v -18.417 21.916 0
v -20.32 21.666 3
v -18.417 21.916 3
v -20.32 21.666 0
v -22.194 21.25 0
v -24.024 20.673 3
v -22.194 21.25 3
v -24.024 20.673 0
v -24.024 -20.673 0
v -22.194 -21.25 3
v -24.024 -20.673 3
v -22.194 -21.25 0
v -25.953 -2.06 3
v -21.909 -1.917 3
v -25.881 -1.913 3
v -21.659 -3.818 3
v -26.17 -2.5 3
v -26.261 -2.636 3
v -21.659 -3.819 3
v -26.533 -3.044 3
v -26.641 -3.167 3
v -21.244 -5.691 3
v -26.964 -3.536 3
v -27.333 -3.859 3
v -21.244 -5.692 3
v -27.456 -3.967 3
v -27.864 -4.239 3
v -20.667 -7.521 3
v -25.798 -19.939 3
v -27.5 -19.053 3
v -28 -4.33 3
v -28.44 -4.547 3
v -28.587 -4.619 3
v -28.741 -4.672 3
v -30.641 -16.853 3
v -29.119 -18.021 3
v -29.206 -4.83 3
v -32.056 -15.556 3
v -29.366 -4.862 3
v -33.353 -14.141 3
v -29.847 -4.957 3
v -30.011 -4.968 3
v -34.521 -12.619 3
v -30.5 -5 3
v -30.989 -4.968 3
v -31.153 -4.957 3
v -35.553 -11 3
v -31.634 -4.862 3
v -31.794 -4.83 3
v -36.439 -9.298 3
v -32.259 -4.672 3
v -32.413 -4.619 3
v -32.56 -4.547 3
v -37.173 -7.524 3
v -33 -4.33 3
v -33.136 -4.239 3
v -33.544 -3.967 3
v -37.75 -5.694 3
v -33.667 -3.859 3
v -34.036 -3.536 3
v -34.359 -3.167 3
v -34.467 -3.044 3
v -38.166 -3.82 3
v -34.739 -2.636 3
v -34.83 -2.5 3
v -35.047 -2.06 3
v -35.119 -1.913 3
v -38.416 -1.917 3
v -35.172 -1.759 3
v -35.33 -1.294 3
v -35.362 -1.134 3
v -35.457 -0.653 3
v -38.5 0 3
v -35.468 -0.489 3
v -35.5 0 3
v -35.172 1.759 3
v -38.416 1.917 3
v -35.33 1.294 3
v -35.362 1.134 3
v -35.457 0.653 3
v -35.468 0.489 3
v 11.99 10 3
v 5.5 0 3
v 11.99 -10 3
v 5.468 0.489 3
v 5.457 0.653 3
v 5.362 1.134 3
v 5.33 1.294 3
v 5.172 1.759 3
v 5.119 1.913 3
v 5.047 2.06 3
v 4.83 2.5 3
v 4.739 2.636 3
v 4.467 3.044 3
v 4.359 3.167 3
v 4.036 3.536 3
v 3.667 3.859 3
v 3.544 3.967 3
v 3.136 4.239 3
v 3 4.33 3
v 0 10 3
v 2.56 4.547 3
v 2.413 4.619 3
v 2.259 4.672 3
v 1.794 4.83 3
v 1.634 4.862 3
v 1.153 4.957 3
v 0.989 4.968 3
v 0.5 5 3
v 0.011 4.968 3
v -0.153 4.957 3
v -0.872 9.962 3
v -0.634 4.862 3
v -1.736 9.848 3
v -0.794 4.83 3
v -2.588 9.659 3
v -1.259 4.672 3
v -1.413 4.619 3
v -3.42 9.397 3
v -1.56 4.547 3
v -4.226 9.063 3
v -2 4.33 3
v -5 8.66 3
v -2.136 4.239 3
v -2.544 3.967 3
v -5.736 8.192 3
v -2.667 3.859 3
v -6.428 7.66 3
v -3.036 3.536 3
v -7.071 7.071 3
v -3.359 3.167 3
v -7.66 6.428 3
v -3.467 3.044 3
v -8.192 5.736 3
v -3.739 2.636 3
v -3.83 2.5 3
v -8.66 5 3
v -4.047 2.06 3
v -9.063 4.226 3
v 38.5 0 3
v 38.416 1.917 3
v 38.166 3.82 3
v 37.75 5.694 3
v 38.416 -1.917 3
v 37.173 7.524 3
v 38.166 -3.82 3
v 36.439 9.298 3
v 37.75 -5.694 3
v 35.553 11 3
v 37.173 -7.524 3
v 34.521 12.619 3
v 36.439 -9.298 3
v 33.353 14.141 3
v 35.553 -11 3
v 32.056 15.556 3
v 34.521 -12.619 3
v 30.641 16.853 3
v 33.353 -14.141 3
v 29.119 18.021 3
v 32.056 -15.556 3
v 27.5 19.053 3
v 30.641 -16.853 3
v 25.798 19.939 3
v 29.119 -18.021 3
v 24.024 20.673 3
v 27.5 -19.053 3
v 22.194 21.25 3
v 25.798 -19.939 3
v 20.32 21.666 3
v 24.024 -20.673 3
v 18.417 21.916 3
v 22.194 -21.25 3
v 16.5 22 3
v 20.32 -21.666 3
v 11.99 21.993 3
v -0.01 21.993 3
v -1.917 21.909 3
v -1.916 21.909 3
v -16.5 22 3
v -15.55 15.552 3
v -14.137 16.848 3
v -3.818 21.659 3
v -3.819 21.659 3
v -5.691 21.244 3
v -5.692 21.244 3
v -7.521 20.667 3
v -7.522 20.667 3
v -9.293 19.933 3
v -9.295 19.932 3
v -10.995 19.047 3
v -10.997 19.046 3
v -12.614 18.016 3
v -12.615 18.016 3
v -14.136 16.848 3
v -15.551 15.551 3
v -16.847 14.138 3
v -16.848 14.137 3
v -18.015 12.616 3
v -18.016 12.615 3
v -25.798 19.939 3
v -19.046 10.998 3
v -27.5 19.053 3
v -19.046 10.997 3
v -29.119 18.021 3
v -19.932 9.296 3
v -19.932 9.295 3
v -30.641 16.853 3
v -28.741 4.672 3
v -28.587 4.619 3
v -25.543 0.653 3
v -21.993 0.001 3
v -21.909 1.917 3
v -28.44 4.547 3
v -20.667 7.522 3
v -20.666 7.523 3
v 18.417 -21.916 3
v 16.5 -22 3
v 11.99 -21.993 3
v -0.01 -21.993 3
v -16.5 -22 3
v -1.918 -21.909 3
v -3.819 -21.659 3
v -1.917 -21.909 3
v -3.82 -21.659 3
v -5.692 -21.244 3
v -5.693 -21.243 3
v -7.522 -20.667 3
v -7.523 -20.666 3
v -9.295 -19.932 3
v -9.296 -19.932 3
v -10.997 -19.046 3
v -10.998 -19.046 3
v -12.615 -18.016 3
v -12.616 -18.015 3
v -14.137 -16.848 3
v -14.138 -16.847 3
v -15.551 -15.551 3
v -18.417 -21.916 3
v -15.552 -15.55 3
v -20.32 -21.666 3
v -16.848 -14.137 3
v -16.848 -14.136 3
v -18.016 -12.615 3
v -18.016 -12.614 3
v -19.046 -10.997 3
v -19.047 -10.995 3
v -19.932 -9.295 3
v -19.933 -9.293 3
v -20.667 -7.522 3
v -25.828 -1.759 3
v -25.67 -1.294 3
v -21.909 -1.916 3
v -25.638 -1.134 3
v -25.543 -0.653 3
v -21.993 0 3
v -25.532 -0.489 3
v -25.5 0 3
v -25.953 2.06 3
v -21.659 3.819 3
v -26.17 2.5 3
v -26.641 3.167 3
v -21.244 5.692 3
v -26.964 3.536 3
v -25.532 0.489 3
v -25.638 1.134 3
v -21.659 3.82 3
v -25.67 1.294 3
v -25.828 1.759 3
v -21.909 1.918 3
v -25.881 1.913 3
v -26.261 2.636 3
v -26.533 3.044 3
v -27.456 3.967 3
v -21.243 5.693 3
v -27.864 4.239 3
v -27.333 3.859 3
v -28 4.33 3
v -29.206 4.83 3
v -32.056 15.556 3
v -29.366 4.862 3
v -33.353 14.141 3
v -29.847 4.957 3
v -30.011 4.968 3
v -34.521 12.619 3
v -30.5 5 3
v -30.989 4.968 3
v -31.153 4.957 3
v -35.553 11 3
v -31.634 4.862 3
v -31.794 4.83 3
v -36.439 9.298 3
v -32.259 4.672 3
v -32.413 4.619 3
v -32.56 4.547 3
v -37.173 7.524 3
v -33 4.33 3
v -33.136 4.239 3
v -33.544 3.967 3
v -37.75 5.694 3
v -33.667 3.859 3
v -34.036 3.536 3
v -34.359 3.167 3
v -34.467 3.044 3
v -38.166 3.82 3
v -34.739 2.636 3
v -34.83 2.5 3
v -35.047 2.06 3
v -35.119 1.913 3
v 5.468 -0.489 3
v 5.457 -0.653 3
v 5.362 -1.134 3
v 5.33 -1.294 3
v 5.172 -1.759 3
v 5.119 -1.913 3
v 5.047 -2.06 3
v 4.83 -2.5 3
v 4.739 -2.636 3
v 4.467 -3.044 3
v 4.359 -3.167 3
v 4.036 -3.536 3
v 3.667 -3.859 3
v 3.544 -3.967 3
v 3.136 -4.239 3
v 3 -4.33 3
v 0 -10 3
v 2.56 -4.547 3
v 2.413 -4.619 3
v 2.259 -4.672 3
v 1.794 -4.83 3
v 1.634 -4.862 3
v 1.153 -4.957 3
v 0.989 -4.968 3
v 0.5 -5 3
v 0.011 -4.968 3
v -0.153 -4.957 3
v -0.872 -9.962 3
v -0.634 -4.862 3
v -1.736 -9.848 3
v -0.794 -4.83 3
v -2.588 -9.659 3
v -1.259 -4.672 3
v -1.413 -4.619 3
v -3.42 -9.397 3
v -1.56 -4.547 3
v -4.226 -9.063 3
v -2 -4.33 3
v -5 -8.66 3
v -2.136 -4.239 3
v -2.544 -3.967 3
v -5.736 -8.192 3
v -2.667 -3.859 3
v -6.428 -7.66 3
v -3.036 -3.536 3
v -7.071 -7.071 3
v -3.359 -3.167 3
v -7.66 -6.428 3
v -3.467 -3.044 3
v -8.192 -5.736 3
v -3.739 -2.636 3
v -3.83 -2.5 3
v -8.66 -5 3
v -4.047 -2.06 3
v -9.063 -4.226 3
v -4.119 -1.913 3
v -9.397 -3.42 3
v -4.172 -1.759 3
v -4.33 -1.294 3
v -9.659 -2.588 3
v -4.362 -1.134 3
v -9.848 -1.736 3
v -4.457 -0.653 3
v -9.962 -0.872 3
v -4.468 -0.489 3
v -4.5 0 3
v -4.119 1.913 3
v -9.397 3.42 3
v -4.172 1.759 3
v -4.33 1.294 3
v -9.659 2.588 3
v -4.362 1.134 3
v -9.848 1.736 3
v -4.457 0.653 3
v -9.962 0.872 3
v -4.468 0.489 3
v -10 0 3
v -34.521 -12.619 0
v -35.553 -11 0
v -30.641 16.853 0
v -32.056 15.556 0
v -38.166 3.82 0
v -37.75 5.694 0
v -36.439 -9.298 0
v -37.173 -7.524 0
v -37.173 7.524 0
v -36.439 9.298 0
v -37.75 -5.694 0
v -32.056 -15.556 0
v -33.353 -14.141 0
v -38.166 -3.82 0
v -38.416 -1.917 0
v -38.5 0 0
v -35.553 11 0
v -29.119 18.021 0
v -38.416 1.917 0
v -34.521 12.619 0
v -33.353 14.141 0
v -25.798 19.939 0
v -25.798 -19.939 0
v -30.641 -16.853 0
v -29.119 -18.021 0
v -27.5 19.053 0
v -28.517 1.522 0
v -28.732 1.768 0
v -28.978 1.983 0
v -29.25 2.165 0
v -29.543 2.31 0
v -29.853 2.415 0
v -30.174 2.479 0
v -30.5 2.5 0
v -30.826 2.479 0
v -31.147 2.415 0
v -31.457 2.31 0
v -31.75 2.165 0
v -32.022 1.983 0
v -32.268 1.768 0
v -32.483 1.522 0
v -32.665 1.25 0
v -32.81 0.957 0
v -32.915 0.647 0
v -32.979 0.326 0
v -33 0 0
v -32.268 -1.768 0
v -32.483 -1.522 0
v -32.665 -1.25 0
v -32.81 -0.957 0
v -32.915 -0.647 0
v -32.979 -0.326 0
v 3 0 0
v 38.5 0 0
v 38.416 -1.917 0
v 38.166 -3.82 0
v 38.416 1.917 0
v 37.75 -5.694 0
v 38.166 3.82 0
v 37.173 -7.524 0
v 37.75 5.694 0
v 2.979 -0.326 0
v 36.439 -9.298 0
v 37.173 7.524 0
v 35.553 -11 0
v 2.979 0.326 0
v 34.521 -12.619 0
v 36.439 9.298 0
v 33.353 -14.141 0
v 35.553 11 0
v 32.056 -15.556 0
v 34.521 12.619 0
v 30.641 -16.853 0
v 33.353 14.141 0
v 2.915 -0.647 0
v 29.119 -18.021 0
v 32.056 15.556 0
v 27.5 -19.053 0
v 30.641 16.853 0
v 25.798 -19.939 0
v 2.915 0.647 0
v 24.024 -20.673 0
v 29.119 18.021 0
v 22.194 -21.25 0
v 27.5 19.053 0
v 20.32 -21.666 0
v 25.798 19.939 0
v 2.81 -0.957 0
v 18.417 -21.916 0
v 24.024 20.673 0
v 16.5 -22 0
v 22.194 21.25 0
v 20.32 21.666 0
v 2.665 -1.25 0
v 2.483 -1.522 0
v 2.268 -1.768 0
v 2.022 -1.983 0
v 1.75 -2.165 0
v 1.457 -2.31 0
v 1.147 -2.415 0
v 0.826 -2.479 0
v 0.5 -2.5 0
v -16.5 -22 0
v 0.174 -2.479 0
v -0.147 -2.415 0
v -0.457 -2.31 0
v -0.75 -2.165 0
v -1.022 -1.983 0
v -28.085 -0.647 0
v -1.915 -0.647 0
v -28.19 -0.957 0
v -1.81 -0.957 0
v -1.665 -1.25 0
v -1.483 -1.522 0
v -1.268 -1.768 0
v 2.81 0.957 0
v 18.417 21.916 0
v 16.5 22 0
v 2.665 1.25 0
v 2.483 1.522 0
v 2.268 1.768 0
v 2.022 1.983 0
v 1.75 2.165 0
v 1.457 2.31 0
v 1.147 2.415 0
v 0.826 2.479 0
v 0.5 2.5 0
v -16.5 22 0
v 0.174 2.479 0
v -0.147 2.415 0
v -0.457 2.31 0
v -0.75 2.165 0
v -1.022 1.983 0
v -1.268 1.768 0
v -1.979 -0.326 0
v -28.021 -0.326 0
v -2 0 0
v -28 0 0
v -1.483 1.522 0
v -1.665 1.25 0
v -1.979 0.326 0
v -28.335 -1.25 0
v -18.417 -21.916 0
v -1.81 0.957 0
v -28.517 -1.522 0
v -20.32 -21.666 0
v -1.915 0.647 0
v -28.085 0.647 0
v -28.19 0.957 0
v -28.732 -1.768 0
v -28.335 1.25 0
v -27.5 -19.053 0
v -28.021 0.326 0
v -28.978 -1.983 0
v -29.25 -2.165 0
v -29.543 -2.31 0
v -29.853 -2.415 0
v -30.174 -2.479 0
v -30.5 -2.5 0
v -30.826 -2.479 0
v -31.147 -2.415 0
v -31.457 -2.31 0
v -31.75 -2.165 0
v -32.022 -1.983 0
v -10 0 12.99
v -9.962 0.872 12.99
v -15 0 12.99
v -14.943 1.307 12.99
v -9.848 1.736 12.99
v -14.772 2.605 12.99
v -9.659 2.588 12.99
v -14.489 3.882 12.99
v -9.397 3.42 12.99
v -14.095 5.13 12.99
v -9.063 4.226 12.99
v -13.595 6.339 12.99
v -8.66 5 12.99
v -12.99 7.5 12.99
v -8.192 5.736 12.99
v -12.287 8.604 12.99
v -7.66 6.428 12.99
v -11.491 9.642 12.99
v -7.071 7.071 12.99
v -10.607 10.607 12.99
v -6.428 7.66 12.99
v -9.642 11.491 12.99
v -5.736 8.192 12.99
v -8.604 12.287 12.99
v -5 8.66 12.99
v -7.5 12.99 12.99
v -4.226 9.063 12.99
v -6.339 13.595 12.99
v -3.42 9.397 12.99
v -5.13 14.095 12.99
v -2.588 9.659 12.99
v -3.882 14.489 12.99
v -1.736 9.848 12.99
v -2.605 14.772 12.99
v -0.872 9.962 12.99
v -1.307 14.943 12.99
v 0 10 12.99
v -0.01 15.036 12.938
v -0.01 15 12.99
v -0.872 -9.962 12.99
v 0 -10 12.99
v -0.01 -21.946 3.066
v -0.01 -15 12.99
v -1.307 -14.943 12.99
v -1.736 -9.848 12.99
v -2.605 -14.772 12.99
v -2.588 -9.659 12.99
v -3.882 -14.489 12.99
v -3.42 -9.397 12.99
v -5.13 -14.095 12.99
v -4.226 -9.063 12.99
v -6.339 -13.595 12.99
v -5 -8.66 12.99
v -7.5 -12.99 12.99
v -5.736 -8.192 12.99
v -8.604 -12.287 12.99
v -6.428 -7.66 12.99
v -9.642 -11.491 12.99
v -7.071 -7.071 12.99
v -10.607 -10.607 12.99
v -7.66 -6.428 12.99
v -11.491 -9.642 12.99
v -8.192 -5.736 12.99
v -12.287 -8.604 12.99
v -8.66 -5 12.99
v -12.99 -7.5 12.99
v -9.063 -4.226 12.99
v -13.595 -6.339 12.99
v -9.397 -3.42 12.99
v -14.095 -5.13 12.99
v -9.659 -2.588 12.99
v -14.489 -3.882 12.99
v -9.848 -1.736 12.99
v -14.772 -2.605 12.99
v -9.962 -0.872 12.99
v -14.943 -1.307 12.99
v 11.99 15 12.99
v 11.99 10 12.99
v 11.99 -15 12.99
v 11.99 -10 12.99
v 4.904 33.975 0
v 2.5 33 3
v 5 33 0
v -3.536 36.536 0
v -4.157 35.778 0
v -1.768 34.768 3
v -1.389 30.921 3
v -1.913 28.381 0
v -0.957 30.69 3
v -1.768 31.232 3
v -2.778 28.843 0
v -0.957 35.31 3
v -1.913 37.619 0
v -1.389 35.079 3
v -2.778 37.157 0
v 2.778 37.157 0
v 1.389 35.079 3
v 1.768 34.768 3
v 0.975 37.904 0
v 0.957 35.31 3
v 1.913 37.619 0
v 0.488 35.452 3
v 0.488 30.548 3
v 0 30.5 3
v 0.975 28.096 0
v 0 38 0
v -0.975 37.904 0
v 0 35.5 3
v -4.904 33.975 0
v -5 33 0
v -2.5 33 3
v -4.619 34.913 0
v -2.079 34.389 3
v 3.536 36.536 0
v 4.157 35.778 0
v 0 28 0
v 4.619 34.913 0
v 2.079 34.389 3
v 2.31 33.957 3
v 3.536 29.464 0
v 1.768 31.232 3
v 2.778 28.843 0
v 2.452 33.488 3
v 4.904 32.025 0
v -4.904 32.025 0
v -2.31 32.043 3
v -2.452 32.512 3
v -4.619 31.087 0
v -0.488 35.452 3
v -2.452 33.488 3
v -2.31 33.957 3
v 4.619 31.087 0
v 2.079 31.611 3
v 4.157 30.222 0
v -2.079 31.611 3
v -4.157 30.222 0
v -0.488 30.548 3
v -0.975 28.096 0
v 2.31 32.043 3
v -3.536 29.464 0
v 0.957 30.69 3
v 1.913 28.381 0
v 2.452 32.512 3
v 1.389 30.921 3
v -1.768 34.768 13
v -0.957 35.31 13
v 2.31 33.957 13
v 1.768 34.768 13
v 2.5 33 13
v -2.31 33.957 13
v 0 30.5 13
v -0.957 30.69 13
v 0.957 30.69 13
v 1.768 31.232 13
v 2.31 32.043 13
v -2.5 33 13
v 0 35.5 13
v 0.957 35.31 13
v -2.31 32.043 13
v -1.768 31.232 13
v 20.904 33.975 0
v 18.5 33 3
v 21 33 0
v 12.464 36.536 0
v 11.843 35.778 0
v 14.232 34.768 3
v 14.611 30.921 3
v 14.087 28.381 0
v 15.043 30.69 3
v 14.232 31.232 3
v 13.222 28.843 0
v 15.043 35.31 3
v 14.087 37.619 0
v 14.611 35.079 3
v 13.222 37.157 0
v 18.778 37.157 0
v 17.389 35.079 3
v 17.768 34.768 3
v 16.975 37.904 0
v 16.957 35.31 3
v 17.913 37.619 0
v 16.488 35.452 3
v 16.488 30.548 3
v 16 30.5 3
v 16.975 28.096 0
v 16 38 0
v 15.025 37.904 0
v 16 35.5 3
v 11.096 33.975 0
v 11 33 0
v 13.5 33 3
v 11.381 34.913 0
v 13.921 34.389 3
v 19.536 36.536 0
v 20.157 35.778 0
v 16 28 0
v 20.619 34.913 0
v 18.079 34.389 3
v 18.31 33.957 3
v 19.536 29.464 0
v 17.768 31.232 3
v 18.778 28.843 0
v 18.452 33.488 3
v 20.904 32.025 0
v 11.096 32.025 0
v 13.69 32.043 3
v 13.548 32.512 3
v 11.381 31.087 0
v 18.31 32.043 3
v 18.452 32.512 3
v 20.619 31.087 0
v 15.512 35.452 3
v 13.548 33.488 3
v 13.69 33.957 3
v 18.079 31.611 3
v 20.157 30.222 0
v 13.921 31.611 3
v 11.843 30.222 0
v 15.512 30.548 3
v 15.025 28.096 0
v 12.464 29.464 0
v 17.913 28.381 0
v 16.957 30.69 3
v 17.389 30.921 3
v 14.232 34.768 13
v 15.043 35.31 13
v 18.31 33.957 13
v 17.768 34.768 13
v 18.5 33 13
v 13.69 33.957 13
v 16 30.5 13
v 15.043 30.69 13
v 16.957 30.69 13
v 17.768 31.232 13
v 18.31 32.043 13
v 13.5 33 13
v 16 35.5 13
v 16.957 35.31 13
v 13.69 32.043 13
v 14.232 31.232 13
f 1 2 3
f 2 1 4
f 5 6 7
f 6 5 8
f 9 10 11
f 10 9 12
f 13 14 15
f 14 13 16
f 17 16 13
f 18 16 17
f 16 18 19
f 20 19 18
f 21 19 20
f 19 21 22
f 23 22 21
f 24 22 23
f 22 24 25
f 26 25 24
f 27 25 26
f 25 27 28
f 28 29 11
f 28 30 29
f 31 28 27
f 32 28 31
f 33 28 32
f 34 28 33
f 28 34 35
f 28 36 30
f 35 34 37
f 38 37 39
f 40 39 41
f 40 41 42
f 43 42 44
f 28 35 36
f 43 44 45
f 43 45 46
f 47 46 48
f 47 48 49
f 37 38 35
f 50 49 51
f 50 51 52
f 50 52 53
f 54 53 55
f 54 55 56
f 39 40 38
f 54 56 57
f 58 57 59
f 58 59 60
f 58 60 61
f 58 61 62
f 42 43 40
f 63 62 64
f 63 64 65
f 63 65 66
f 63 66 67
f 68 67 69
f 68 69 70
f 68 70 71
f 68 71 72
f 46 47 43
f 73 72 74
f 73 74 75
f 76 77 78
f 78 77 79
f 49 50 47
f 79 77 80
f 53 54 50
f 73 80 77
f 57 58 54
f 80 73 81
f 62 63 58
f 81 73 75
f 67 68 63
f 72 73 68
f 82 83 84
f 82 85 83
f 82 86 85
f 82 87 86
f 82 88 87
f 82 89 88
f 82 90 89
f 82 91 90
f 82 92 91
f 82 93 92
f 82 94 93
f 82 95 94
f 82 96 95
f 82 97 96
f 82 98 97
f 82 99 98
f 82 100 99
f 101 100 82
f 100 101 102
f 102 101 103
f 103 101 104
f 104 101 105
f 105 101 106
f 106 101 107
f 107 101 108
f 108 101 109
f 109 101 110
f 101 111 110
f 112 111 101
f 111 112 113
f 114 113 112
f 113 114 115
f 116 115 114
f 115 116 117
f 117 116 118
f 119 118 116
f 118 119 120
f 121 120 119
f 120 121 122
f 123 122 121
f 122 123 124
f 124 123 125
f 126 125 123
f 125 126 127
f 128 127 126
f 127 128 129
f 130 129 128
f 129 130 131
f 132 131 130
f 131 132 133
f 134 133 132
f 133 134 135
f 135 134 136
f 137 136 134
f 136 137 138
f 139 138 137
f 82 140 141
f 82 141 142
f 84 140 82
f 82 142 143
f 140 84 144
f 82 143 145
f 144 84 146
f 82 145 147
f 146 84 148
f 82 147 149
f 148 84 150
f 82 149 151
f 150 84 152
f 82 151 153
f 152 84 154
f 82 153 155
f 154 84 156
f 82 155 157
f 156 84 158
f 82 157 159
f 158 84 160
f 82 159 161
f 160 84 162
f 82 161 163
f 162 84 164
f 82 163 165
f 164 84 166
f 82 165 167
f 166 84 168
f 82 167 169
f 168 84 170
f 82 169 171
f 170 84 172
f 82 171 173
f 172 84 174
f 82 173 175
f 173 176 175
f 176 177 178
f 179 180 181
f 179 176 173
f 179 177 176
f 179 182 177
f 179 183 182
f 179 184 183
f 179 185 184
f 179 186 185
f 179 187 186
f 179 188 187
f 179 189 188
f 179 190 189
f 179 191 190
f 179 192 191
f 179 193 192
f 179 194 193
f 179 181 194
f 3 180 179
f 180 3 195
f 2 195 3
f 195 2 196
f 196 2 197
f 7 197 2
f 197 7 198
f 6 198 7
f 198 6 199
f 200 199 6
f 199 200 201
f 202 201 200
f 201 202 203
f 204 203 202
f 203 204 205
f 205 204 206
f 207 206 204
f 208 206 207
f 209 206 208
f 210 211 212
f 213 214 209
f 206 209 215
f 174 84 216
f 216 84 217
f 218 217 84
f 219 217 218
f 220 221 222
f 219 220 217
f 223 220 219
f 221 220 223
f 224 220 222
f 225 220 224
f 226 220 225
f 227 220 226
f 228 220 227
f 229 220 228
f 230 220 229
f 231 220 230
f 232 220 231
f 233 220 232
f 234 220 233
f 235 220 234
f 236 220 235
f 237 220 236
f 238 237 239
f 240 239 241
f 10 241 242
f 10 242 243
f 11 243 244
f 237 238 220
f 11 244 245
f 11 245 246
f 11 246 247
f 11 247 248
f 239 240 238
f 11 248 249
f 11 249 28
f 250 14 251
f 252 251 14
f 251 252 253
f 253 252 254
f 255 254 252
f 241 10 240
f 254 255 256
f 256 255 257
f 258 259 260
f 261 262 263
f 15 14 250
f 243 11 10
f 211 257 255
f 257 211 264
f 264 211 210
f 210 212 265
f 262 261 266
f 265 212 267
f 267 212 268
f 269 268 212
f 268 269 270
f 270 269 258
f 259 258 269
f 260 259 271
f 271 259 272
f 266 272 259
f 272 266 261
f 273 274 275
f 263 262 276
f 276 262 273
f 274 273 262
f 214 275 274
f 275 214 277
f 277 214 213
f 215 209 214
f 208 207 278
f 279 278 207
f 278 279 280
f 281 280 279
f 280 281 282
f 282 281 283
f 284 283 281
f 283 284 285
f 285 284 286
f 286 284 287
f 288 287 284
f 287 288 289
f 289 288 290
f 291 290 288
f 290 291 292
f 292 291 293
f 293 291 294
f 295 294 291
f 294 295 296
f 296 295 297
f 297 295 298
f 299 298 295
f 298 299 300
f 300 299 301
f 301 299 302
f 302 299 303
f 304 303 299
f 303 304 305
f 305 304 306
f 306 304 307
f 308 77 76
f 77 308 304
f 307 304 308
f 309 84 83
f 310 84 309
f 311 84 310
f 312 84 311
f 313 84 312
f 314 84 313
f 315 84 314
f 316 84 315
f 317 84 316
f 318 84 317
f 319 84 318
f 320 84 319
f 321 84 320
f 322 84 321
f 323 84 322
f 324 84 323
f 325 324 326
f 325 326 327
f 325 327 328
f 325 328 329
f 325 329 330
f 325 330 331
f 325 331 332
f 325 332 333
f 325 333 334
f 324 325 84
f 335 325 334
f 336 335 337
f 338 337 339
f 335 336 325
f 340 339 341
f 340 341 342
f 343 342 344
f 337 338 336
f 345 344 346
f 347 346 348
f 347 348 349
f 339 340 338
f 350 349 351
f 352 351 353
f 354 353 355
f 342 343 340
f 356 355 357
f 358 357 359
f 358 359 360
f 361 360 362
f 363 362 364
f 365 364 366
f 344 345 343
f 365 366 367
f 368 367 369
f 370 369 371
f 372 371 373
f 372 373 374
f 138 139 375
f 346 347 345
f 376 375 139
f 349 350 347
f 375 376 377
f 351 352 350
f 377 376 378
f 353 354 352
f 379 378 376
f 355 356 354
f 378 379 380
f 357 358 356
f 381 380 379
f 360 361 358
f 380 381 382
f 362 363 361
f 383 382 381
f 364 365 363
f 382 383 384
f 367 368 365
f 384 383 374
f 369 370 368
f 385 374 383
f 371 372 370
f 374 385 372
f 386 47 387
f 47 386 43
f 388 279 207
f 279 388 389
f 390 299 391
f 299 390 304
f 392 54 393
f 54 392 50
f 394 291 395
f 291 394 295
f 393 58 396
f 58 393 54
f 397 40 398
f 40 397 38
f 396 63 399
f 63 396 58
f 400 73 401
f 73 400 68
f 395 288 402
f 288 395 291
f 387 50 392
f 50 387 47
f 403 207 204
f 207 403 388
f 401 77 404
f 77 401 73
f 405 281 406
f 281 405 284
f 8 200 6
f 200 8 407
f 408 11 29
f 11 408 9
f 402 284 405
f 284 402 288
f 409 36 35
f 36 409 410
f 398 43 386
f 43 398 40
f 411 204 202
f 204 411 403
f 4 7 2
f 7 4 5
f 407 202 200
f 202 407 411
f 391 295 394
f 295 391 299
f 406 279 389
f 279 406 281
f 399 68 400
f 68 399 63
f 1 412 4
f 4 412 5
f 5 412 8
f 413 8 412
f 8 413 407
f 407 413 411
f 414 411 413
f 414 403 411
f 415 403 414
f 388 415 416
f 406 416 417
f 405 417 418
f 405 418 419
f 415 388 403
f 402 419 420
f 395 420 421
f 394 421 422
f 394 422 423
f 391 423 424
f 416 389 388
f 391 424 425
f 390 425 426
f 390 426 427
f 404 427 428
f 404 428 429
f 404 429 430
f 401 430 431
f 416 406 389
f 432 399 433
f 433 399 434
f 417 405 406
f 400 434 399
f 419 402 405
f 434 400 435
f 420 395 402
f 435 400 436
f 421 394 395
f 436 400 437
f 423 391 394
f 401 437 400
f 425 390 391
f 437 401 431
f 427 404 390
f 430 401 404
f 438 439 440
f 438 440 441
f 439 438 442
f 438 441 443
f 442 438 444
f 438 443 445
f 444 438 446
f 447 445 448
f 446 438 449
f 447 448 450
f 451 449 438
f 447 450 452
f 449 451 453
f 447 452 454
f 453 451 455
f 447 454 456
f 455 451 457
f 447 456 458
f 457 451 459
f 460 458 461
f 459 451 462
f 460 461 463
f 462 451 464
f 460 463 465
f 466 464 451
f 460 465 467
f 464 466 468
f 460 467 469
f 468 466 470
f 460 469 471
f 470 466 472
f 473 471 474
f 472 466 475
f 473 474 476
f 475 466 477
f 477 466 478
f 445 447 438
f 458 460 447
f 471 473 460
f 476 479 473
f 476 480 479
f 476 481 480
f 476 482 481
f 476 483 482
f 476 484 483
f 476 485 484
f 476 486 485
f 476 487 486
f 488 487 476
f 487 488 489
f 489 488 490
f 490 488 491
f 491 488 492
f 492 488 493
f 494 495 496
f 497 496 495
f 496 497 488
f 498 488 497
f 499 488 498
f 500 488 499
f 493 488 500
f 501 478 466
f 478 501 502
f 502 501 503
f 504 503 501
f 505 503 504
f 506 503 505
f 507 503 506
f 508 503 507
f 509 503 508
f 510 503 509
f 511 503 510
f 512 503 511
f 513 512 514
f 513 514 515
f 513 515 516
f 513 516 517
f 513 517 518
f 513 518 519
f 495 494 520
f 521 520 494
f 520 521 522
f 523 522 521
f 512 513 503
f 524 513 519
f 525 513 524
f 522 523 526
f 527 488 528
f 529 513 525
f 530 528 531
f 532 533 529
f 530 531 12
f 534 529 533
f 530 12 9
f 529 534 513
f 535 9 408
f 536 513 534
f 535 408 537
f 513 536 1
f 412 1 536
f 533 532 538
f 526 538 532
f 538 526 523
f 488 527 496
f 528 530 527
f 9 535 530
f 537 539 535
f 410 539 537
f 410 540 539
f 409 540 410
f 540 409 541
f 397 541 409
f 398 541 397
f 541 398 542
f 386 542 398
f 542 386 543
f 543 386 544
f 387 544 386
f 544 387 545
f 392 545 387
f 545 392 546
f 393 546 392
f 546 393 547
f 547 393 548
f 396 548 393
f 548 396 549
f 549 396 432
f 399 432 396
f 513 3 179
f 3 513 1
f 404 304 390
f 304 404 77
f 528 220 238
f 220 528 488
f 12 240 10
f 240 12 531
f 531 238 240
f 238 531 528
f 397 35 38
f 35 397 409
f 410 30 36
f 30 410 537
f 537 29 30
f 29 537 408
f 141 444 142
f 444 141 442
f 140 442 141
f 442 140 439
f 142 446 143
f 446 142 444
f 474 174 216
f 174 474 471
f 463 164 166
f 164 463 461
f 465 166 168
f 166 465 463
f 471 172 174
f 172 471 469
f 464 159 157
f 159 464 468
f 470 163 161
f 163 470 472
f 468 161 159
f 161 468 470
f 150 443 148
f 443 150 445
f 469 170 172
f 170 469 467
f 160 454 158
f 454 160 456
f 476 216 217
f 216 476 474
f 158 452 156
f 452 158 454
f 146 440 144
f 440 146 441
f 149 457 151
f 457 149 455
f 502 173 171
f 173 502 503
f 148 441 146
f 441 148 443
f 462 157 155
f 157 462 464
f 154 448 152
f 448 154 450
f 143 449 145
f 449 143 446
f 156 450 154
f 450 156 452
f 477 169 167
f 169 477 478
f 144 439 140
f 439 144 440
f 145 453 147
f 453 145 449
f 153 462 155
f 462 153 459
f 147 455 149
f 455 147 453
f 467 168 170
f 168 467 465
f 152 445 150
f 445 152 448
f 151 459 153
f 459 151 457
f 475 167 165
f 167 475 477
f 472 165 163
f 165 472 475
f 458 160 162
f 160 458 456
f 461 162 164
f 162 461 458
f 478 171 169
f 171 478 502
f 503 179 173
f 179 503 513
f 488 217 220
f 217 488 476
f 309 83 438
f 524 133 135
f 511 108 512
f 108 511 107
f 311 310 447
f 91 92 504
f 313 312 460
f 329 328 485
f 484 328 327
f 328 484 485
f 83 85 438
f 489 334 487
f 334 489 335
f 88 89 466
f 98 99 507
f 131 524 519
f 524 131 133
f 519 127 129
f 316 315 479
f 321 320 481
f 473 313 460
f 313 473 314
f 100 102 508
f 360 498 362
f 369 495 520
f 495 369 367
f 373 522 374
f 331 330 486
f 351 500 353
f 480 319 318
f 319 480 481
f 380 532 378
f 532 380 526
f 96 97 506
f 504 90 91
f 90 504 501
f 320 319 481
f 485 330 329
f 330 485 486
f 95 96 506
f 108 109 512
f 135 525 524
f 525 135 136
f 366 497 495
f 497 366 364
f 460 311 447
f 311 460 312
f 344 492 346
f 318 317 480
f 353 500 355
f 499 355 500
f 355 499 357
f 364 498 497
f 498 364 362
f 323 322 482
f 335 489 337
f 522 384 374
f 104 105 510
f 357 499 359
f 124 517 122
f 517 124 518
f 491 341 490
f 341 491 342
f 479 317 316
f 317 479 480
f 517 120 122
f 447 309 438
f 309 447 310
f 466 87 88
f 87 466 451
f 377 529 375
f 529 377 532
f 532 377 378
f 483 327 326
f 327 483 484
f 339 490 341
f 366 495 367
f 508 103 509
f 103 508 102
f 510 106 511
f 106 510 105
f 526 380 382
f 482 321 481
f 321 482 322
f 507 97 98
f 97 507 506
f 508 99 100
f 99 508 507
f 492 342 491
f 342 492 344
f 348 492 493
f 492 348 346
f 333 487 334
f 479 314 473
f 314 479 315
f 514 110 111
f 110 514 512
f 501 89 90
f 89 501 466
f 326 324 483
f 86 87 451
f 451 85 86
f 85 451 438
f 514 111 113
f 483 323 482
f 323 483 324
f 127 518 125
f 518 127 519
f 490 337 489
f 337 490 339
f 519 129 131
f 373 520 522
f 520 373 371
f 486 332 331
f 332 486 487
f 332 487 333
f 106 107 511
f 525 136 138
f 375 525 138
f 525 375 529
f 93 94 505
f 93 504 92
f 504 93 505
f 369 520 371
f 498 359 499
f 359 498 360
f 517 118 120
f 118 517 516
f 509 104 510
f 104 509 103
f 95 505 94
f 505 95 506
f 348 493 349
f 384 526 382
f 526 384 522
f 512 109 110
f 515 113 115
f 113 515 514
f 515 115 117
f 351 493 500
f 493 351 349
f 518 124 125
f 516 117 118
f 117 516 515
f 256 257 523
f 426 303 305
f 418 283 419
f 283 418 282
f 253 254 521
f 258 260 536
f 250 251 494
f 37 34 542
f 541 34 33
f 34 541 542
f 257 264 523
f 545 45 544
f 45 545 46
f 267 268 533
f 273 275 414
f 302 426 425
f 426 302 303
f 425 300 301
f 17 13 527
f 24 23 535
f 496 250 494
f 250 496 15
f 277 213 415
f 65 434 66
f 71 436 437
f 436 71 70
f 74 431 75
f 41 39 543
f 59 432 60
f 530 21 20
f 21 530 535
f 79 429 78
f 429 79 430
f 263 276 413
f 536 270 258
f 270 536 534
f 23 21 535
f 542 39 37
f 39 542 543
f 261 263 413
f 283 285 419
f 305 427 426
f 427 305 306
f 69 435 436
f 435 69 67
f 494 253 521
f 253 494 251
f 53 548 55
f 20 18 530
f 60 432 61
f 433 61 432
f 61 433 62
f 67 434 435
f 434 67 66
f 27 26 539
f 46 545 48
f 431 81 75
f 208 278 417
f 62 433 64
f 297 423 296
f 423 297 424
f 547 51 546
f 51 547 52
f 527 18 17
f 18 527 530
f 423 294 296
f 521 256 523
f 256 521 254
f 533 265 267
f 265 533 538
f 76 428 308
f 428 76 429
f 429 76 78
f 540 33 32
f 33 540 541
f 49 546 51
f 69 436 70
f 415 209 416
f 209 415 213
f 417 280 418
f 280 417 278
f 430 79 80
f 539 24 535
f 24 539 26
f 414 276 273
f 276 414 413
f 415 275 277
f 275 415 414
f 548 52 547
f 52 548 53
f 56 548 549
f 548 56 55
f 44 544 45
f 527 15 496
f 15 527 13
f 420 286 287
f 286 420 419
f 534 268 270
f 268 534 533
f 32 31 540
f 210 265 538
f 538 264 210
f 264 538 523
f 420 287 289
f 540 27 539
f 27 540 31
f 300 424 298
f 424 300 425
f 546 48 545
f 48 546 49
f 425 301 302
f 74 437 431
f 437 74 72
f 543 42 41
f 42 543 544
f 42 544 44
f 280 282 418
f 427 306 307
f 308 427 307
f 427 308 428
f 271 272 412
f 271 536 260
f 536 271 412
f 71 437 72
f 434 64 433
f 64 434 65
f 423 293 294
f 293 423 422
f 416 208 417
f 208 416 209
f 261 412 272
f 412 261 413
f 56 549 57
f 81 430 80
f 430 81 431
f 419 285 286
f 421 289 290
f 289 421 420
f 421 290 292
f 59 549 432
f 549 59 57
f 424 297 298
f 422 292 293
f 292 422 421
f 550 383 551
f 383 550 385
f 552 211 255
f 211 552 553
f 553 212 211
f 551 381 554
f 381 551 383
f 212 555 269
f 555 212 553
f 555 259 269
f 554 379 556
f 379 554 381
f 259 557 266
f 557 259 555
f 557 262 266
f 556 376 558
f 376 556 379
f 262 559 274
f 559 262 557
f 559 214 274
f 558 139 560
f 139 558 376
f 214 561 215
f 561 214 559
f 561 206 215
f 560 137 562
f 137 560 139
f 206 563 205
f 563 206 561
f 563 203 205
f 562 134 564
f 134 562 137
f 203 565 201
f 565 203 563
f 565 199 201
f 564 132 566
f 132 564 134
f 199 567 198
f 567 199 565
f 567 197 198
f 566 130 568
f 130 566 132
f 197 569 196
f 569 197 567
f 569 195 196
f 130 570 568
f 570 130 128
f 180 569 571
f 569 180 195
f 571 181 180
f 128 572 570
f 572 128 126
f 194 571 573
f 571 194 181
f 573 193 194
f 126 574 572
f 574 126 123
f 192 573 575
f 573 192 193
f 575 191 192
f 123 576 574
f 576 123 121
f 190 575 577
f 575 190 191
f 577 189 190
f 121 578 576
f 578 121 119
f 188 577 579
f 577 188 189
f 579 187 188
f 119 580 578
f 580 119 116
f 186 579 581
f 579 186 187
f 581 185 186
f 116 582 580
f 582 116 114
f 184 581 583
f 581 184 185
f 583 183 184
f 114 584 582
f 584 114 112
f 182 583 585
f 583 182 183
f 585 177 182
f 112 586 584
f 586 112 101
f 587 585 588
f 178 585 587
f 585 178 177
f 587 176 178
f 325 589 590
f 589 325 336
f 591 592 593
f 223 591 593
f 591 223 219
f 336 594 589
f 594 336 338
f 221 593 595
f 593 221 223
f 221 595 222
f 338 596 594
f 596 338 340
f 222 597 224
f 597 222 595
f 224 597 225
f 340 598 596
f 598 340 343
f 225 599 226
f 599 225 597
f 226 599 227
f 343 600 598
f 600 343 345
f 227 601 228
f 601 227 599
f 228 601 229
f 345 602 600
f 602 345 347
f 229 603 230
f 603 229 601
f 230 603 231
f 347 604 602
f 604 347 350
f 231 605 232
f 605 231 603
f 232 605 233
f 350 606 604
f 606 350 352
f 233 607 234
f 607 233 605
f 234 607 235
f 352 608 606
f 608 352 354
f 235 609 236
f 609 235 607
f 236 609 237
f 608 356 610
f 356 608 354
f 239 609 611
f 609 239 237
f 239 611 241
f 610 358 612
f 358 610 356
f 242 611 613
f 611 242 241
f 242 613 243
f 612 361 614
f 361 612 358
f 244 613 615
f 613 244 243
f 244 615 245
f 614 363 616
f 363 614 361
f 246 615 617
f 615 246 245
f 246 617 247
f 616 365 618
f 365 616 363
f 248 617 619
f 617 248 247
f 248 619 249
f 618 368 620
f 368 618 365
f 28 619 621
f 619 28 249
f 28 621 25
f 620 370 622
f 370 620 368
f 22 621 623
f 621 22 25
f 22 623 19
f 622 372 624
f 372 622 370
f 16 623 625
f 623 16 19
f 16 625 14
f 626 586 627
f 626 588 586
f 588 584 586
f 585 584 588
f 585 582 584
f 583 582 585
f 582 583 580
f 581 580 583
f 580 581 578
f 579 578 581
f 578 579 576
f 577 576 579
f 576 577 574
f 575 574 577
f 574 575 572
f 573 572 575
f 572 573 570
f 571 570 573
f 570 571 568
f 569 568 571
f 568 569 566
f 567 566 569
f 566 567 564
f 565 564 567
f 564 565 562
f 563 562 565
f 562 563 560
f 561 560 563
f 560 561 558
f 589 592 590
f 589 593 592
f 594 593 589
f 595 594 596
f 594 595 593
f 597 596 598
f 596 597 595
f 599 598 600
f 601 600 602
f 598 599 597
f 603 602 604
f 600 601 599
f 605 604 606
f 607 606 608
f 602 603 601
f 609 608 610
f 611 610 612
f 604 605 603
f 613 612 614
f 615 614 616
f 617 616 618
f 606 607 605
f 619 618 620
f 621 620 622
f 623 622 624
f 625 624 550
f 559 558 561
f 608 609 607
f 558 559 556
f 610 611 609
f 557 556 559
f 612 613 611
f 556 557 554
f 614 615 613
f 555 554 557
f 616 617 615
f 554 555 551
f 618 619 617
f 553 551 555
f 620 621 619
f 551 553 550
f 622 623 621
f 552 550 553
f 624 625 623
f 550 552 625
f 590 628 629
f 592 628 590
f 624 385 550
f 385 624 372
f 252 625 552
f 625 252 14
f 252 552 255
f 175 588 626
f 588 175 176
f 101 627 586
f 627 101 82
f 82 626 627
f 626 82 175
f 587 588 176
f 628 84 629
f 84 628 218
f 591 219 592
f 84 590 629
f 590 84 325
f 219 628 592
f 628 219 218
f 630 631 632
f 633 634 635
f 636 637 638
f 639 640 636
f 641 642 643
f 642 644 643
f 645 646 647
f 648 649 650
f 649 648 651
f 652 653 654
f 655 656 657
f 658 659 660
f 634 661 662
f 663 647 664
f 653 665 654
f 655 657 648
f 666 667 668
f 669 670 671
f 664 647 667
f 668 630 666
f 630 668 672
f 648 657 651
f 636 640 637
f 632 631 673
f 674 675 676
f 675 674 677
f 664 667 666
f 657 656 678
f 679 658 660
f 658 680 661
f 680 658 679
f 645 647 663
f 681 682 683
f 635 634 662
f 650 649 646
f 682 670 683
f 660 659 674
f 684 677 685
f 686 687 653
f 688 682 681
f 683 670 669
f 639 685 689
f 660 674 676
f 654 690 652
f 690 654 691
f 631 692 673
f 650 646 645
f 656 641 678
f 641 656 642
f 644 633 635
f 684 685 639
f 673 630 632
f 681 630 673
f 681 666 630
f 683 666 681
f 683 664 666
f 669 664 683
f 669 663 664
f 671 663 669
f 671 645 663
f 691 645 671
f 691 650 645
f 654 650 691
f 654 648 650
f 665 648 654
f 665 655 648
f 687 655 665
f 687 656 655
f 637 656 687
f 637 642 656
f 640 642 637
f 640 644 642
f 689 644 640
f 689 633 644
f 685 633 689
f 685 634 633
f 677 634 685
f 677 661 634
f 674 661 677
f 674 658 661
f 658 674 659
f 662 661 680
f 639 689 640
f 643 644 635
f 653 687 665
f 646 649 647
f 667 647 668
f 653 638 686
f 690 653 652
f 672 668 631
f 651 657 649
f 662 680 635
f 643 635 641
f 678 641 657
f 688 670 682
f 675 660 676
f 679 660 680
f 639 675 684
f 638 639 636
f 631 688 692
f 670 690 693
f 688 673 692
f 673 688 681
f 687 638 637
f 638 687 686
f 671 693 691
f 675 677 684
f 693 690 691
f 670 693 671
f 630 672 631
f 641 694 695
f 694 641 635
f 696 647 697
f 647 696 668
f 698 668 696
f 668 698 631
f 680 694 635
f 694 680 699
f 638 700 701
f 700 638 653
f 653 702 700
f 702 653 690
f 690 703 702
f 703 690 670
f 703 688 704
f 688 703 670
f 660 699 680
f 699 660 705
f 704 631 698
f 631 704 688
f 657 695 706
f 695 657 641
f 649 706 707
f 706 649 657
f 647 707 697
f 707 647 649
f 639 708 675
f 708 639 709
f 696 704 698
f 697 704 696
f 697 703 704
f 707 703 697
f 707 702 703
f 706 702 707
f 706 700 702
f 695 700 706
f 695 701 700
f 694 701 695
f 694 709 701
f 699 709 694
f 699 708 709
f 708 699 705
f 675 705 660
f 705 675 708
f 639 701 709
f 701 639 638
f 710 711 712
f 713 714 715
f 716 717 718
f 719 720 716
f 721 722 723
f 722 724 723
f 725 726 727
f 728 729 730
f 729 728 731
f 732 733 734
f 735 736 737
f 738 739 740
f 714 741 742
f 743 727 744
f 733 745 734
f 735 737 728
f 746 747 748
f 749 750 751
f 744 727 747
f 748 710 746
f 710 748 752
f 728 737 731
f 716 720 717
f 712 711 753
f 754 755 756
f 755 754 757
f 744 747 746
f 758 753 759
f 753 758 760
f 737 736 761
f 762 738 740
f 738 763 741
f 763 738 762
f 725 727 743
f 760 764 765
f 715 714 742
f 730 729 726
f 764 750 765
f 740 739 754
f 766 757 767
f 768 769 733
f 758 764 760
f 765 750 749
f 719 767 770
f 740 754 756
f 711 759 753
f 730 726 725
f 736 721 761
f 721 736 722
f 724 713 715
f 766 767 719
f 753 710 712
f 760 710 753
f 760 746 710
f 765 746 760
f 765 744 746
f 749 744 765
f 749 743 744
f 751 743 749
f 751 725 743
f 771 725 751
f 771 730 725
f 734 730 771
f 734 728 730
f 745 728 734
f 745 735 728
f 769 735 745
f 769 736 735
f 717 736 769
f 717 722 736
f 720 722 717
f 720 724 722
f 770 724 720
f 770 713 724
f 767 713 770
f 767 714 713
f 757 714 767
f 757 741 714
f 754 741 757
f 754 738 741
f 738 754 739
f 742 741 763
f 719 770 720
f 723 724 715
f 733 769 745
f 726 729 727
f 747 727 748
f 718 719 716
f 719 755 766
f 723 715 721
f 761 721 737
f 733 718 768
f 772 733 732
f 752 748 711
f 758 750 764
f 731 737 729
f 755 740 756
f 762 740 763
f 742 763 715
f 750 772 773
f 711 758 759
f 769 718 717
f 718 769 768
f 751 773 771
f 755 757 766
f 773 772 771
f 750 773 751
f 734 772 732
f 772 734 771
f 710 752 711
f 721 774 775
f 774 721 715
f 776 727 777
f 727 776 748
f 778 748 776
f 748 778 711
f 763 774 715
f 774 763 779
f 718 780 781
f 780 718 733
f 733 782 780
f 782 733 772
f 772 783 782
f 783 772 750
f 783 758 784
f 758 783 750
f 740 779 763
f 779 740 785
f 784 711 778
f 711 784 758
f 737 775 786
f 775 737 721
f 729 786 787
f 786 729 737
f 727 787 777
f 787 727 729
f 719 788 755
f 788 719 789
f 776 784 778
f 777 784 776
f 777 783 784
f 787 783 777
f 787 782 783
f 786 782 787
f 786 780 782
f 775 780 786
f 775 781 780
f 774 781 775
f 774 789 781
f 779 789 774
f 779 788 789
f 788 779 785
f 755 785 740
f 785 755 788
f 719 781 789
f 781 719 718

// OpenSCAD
/* [General] */

// Thickness of bar (add some tolerance)
bar_thickness = 20; // [5:30]
// back thickness of holder around bar
holder_bottom_thickness = 12; // [5:20]
// front thickness of holder around bar
holder_top_thickness = 5; // [0:20]
// thickness of base plate
base_thickness = 3; // [2:5]

/* [Plug] */

plug_depth = 10;
plug_thickness = 5;
// distance inbetween plugs
plug_distance = 26;
// offset location from vertical center
plugs_offset = -15;

/* [Hidden] */

// slight overlap / fudge factor
o = 0.01;
// distance between parts on plate
distance = 6;
bar_radius = bar_thickness/2;
plug_radius = plug_thickness/2;
base_width = bar_thickness+holder_bottom_thickness*2;
base_height = base_width*1.75;
$fa = 5;
$fs = 1;
// from https://github.com/elmom/MCAD/blob/master/boxes.scad
include <MCAD/boxes.scad>

base();
translate([0,0,base_thickness-o]) holder();

translate([0,base_width/2+plug_radius*2+distance,0]) {
  plug();
  translate([plug_radius*4+distance,0,0]) plug();
}

// this is the piece that sticks out to holds the bar
// we will be extruding this
module wall_mold() {
  polygon(points=[[0,0],[0,10],[holder_top_thickness,10],[holder_bottom_thickness,0]]);
}
module holder() {
  difference()
  {
    // this is a circle extrusion of the wall_mold()
    rotate_extrude(convexity = 10) translate([bar_radius, 0, 0]) wall_mold();
    // we only want the bottom 1/2 so lets take take away the top half
    translate([base_width/2,0,15/2-0.1]) cube([base_width,base_width,15],center=true);
  }
  // Here is the "straight" extrusions for the wall_mold()
  translate([-o,bar_radius,0]) rotate([90,0,90])
    linear_extrude( height=bar_radius+2) wall_mold();
  translate([bar_radius+2-o,-bar_radius,0]) rotate([90,0,-90]) 
    linear_extrude(height=bar_radius+2) wall_mold();
}
module base() {
  difference()
  {
     translate([0,0,base_thickness/2]) roundedBox([base_height,base_width, base_thickness], base_width/2, true);
     translate([plugs_offset,0,0]) {
      //
      rotate([180,0,0]) translate([0,0,-base_thickness]) {
        translate([plug_distance/2+plug_radius,0,0]) plug(true);
        translate([-plug_distance/2-plug_radius,0,0]) plug(true);
      }
    }
  }
}
module plug(remove=false) {
  if(remove) {
    translate([0,0,-base_thickness]) cylinder(base_thickness*2,plug_radius*3,plug_radius);
  } else {
    cylinder(base_thickness,plug_radius*2,plug_radius);
  }
  translate([0,0,base_thickness-o])
    cylinder(plug_depth+o,plug_radius,plug_radius);
}
